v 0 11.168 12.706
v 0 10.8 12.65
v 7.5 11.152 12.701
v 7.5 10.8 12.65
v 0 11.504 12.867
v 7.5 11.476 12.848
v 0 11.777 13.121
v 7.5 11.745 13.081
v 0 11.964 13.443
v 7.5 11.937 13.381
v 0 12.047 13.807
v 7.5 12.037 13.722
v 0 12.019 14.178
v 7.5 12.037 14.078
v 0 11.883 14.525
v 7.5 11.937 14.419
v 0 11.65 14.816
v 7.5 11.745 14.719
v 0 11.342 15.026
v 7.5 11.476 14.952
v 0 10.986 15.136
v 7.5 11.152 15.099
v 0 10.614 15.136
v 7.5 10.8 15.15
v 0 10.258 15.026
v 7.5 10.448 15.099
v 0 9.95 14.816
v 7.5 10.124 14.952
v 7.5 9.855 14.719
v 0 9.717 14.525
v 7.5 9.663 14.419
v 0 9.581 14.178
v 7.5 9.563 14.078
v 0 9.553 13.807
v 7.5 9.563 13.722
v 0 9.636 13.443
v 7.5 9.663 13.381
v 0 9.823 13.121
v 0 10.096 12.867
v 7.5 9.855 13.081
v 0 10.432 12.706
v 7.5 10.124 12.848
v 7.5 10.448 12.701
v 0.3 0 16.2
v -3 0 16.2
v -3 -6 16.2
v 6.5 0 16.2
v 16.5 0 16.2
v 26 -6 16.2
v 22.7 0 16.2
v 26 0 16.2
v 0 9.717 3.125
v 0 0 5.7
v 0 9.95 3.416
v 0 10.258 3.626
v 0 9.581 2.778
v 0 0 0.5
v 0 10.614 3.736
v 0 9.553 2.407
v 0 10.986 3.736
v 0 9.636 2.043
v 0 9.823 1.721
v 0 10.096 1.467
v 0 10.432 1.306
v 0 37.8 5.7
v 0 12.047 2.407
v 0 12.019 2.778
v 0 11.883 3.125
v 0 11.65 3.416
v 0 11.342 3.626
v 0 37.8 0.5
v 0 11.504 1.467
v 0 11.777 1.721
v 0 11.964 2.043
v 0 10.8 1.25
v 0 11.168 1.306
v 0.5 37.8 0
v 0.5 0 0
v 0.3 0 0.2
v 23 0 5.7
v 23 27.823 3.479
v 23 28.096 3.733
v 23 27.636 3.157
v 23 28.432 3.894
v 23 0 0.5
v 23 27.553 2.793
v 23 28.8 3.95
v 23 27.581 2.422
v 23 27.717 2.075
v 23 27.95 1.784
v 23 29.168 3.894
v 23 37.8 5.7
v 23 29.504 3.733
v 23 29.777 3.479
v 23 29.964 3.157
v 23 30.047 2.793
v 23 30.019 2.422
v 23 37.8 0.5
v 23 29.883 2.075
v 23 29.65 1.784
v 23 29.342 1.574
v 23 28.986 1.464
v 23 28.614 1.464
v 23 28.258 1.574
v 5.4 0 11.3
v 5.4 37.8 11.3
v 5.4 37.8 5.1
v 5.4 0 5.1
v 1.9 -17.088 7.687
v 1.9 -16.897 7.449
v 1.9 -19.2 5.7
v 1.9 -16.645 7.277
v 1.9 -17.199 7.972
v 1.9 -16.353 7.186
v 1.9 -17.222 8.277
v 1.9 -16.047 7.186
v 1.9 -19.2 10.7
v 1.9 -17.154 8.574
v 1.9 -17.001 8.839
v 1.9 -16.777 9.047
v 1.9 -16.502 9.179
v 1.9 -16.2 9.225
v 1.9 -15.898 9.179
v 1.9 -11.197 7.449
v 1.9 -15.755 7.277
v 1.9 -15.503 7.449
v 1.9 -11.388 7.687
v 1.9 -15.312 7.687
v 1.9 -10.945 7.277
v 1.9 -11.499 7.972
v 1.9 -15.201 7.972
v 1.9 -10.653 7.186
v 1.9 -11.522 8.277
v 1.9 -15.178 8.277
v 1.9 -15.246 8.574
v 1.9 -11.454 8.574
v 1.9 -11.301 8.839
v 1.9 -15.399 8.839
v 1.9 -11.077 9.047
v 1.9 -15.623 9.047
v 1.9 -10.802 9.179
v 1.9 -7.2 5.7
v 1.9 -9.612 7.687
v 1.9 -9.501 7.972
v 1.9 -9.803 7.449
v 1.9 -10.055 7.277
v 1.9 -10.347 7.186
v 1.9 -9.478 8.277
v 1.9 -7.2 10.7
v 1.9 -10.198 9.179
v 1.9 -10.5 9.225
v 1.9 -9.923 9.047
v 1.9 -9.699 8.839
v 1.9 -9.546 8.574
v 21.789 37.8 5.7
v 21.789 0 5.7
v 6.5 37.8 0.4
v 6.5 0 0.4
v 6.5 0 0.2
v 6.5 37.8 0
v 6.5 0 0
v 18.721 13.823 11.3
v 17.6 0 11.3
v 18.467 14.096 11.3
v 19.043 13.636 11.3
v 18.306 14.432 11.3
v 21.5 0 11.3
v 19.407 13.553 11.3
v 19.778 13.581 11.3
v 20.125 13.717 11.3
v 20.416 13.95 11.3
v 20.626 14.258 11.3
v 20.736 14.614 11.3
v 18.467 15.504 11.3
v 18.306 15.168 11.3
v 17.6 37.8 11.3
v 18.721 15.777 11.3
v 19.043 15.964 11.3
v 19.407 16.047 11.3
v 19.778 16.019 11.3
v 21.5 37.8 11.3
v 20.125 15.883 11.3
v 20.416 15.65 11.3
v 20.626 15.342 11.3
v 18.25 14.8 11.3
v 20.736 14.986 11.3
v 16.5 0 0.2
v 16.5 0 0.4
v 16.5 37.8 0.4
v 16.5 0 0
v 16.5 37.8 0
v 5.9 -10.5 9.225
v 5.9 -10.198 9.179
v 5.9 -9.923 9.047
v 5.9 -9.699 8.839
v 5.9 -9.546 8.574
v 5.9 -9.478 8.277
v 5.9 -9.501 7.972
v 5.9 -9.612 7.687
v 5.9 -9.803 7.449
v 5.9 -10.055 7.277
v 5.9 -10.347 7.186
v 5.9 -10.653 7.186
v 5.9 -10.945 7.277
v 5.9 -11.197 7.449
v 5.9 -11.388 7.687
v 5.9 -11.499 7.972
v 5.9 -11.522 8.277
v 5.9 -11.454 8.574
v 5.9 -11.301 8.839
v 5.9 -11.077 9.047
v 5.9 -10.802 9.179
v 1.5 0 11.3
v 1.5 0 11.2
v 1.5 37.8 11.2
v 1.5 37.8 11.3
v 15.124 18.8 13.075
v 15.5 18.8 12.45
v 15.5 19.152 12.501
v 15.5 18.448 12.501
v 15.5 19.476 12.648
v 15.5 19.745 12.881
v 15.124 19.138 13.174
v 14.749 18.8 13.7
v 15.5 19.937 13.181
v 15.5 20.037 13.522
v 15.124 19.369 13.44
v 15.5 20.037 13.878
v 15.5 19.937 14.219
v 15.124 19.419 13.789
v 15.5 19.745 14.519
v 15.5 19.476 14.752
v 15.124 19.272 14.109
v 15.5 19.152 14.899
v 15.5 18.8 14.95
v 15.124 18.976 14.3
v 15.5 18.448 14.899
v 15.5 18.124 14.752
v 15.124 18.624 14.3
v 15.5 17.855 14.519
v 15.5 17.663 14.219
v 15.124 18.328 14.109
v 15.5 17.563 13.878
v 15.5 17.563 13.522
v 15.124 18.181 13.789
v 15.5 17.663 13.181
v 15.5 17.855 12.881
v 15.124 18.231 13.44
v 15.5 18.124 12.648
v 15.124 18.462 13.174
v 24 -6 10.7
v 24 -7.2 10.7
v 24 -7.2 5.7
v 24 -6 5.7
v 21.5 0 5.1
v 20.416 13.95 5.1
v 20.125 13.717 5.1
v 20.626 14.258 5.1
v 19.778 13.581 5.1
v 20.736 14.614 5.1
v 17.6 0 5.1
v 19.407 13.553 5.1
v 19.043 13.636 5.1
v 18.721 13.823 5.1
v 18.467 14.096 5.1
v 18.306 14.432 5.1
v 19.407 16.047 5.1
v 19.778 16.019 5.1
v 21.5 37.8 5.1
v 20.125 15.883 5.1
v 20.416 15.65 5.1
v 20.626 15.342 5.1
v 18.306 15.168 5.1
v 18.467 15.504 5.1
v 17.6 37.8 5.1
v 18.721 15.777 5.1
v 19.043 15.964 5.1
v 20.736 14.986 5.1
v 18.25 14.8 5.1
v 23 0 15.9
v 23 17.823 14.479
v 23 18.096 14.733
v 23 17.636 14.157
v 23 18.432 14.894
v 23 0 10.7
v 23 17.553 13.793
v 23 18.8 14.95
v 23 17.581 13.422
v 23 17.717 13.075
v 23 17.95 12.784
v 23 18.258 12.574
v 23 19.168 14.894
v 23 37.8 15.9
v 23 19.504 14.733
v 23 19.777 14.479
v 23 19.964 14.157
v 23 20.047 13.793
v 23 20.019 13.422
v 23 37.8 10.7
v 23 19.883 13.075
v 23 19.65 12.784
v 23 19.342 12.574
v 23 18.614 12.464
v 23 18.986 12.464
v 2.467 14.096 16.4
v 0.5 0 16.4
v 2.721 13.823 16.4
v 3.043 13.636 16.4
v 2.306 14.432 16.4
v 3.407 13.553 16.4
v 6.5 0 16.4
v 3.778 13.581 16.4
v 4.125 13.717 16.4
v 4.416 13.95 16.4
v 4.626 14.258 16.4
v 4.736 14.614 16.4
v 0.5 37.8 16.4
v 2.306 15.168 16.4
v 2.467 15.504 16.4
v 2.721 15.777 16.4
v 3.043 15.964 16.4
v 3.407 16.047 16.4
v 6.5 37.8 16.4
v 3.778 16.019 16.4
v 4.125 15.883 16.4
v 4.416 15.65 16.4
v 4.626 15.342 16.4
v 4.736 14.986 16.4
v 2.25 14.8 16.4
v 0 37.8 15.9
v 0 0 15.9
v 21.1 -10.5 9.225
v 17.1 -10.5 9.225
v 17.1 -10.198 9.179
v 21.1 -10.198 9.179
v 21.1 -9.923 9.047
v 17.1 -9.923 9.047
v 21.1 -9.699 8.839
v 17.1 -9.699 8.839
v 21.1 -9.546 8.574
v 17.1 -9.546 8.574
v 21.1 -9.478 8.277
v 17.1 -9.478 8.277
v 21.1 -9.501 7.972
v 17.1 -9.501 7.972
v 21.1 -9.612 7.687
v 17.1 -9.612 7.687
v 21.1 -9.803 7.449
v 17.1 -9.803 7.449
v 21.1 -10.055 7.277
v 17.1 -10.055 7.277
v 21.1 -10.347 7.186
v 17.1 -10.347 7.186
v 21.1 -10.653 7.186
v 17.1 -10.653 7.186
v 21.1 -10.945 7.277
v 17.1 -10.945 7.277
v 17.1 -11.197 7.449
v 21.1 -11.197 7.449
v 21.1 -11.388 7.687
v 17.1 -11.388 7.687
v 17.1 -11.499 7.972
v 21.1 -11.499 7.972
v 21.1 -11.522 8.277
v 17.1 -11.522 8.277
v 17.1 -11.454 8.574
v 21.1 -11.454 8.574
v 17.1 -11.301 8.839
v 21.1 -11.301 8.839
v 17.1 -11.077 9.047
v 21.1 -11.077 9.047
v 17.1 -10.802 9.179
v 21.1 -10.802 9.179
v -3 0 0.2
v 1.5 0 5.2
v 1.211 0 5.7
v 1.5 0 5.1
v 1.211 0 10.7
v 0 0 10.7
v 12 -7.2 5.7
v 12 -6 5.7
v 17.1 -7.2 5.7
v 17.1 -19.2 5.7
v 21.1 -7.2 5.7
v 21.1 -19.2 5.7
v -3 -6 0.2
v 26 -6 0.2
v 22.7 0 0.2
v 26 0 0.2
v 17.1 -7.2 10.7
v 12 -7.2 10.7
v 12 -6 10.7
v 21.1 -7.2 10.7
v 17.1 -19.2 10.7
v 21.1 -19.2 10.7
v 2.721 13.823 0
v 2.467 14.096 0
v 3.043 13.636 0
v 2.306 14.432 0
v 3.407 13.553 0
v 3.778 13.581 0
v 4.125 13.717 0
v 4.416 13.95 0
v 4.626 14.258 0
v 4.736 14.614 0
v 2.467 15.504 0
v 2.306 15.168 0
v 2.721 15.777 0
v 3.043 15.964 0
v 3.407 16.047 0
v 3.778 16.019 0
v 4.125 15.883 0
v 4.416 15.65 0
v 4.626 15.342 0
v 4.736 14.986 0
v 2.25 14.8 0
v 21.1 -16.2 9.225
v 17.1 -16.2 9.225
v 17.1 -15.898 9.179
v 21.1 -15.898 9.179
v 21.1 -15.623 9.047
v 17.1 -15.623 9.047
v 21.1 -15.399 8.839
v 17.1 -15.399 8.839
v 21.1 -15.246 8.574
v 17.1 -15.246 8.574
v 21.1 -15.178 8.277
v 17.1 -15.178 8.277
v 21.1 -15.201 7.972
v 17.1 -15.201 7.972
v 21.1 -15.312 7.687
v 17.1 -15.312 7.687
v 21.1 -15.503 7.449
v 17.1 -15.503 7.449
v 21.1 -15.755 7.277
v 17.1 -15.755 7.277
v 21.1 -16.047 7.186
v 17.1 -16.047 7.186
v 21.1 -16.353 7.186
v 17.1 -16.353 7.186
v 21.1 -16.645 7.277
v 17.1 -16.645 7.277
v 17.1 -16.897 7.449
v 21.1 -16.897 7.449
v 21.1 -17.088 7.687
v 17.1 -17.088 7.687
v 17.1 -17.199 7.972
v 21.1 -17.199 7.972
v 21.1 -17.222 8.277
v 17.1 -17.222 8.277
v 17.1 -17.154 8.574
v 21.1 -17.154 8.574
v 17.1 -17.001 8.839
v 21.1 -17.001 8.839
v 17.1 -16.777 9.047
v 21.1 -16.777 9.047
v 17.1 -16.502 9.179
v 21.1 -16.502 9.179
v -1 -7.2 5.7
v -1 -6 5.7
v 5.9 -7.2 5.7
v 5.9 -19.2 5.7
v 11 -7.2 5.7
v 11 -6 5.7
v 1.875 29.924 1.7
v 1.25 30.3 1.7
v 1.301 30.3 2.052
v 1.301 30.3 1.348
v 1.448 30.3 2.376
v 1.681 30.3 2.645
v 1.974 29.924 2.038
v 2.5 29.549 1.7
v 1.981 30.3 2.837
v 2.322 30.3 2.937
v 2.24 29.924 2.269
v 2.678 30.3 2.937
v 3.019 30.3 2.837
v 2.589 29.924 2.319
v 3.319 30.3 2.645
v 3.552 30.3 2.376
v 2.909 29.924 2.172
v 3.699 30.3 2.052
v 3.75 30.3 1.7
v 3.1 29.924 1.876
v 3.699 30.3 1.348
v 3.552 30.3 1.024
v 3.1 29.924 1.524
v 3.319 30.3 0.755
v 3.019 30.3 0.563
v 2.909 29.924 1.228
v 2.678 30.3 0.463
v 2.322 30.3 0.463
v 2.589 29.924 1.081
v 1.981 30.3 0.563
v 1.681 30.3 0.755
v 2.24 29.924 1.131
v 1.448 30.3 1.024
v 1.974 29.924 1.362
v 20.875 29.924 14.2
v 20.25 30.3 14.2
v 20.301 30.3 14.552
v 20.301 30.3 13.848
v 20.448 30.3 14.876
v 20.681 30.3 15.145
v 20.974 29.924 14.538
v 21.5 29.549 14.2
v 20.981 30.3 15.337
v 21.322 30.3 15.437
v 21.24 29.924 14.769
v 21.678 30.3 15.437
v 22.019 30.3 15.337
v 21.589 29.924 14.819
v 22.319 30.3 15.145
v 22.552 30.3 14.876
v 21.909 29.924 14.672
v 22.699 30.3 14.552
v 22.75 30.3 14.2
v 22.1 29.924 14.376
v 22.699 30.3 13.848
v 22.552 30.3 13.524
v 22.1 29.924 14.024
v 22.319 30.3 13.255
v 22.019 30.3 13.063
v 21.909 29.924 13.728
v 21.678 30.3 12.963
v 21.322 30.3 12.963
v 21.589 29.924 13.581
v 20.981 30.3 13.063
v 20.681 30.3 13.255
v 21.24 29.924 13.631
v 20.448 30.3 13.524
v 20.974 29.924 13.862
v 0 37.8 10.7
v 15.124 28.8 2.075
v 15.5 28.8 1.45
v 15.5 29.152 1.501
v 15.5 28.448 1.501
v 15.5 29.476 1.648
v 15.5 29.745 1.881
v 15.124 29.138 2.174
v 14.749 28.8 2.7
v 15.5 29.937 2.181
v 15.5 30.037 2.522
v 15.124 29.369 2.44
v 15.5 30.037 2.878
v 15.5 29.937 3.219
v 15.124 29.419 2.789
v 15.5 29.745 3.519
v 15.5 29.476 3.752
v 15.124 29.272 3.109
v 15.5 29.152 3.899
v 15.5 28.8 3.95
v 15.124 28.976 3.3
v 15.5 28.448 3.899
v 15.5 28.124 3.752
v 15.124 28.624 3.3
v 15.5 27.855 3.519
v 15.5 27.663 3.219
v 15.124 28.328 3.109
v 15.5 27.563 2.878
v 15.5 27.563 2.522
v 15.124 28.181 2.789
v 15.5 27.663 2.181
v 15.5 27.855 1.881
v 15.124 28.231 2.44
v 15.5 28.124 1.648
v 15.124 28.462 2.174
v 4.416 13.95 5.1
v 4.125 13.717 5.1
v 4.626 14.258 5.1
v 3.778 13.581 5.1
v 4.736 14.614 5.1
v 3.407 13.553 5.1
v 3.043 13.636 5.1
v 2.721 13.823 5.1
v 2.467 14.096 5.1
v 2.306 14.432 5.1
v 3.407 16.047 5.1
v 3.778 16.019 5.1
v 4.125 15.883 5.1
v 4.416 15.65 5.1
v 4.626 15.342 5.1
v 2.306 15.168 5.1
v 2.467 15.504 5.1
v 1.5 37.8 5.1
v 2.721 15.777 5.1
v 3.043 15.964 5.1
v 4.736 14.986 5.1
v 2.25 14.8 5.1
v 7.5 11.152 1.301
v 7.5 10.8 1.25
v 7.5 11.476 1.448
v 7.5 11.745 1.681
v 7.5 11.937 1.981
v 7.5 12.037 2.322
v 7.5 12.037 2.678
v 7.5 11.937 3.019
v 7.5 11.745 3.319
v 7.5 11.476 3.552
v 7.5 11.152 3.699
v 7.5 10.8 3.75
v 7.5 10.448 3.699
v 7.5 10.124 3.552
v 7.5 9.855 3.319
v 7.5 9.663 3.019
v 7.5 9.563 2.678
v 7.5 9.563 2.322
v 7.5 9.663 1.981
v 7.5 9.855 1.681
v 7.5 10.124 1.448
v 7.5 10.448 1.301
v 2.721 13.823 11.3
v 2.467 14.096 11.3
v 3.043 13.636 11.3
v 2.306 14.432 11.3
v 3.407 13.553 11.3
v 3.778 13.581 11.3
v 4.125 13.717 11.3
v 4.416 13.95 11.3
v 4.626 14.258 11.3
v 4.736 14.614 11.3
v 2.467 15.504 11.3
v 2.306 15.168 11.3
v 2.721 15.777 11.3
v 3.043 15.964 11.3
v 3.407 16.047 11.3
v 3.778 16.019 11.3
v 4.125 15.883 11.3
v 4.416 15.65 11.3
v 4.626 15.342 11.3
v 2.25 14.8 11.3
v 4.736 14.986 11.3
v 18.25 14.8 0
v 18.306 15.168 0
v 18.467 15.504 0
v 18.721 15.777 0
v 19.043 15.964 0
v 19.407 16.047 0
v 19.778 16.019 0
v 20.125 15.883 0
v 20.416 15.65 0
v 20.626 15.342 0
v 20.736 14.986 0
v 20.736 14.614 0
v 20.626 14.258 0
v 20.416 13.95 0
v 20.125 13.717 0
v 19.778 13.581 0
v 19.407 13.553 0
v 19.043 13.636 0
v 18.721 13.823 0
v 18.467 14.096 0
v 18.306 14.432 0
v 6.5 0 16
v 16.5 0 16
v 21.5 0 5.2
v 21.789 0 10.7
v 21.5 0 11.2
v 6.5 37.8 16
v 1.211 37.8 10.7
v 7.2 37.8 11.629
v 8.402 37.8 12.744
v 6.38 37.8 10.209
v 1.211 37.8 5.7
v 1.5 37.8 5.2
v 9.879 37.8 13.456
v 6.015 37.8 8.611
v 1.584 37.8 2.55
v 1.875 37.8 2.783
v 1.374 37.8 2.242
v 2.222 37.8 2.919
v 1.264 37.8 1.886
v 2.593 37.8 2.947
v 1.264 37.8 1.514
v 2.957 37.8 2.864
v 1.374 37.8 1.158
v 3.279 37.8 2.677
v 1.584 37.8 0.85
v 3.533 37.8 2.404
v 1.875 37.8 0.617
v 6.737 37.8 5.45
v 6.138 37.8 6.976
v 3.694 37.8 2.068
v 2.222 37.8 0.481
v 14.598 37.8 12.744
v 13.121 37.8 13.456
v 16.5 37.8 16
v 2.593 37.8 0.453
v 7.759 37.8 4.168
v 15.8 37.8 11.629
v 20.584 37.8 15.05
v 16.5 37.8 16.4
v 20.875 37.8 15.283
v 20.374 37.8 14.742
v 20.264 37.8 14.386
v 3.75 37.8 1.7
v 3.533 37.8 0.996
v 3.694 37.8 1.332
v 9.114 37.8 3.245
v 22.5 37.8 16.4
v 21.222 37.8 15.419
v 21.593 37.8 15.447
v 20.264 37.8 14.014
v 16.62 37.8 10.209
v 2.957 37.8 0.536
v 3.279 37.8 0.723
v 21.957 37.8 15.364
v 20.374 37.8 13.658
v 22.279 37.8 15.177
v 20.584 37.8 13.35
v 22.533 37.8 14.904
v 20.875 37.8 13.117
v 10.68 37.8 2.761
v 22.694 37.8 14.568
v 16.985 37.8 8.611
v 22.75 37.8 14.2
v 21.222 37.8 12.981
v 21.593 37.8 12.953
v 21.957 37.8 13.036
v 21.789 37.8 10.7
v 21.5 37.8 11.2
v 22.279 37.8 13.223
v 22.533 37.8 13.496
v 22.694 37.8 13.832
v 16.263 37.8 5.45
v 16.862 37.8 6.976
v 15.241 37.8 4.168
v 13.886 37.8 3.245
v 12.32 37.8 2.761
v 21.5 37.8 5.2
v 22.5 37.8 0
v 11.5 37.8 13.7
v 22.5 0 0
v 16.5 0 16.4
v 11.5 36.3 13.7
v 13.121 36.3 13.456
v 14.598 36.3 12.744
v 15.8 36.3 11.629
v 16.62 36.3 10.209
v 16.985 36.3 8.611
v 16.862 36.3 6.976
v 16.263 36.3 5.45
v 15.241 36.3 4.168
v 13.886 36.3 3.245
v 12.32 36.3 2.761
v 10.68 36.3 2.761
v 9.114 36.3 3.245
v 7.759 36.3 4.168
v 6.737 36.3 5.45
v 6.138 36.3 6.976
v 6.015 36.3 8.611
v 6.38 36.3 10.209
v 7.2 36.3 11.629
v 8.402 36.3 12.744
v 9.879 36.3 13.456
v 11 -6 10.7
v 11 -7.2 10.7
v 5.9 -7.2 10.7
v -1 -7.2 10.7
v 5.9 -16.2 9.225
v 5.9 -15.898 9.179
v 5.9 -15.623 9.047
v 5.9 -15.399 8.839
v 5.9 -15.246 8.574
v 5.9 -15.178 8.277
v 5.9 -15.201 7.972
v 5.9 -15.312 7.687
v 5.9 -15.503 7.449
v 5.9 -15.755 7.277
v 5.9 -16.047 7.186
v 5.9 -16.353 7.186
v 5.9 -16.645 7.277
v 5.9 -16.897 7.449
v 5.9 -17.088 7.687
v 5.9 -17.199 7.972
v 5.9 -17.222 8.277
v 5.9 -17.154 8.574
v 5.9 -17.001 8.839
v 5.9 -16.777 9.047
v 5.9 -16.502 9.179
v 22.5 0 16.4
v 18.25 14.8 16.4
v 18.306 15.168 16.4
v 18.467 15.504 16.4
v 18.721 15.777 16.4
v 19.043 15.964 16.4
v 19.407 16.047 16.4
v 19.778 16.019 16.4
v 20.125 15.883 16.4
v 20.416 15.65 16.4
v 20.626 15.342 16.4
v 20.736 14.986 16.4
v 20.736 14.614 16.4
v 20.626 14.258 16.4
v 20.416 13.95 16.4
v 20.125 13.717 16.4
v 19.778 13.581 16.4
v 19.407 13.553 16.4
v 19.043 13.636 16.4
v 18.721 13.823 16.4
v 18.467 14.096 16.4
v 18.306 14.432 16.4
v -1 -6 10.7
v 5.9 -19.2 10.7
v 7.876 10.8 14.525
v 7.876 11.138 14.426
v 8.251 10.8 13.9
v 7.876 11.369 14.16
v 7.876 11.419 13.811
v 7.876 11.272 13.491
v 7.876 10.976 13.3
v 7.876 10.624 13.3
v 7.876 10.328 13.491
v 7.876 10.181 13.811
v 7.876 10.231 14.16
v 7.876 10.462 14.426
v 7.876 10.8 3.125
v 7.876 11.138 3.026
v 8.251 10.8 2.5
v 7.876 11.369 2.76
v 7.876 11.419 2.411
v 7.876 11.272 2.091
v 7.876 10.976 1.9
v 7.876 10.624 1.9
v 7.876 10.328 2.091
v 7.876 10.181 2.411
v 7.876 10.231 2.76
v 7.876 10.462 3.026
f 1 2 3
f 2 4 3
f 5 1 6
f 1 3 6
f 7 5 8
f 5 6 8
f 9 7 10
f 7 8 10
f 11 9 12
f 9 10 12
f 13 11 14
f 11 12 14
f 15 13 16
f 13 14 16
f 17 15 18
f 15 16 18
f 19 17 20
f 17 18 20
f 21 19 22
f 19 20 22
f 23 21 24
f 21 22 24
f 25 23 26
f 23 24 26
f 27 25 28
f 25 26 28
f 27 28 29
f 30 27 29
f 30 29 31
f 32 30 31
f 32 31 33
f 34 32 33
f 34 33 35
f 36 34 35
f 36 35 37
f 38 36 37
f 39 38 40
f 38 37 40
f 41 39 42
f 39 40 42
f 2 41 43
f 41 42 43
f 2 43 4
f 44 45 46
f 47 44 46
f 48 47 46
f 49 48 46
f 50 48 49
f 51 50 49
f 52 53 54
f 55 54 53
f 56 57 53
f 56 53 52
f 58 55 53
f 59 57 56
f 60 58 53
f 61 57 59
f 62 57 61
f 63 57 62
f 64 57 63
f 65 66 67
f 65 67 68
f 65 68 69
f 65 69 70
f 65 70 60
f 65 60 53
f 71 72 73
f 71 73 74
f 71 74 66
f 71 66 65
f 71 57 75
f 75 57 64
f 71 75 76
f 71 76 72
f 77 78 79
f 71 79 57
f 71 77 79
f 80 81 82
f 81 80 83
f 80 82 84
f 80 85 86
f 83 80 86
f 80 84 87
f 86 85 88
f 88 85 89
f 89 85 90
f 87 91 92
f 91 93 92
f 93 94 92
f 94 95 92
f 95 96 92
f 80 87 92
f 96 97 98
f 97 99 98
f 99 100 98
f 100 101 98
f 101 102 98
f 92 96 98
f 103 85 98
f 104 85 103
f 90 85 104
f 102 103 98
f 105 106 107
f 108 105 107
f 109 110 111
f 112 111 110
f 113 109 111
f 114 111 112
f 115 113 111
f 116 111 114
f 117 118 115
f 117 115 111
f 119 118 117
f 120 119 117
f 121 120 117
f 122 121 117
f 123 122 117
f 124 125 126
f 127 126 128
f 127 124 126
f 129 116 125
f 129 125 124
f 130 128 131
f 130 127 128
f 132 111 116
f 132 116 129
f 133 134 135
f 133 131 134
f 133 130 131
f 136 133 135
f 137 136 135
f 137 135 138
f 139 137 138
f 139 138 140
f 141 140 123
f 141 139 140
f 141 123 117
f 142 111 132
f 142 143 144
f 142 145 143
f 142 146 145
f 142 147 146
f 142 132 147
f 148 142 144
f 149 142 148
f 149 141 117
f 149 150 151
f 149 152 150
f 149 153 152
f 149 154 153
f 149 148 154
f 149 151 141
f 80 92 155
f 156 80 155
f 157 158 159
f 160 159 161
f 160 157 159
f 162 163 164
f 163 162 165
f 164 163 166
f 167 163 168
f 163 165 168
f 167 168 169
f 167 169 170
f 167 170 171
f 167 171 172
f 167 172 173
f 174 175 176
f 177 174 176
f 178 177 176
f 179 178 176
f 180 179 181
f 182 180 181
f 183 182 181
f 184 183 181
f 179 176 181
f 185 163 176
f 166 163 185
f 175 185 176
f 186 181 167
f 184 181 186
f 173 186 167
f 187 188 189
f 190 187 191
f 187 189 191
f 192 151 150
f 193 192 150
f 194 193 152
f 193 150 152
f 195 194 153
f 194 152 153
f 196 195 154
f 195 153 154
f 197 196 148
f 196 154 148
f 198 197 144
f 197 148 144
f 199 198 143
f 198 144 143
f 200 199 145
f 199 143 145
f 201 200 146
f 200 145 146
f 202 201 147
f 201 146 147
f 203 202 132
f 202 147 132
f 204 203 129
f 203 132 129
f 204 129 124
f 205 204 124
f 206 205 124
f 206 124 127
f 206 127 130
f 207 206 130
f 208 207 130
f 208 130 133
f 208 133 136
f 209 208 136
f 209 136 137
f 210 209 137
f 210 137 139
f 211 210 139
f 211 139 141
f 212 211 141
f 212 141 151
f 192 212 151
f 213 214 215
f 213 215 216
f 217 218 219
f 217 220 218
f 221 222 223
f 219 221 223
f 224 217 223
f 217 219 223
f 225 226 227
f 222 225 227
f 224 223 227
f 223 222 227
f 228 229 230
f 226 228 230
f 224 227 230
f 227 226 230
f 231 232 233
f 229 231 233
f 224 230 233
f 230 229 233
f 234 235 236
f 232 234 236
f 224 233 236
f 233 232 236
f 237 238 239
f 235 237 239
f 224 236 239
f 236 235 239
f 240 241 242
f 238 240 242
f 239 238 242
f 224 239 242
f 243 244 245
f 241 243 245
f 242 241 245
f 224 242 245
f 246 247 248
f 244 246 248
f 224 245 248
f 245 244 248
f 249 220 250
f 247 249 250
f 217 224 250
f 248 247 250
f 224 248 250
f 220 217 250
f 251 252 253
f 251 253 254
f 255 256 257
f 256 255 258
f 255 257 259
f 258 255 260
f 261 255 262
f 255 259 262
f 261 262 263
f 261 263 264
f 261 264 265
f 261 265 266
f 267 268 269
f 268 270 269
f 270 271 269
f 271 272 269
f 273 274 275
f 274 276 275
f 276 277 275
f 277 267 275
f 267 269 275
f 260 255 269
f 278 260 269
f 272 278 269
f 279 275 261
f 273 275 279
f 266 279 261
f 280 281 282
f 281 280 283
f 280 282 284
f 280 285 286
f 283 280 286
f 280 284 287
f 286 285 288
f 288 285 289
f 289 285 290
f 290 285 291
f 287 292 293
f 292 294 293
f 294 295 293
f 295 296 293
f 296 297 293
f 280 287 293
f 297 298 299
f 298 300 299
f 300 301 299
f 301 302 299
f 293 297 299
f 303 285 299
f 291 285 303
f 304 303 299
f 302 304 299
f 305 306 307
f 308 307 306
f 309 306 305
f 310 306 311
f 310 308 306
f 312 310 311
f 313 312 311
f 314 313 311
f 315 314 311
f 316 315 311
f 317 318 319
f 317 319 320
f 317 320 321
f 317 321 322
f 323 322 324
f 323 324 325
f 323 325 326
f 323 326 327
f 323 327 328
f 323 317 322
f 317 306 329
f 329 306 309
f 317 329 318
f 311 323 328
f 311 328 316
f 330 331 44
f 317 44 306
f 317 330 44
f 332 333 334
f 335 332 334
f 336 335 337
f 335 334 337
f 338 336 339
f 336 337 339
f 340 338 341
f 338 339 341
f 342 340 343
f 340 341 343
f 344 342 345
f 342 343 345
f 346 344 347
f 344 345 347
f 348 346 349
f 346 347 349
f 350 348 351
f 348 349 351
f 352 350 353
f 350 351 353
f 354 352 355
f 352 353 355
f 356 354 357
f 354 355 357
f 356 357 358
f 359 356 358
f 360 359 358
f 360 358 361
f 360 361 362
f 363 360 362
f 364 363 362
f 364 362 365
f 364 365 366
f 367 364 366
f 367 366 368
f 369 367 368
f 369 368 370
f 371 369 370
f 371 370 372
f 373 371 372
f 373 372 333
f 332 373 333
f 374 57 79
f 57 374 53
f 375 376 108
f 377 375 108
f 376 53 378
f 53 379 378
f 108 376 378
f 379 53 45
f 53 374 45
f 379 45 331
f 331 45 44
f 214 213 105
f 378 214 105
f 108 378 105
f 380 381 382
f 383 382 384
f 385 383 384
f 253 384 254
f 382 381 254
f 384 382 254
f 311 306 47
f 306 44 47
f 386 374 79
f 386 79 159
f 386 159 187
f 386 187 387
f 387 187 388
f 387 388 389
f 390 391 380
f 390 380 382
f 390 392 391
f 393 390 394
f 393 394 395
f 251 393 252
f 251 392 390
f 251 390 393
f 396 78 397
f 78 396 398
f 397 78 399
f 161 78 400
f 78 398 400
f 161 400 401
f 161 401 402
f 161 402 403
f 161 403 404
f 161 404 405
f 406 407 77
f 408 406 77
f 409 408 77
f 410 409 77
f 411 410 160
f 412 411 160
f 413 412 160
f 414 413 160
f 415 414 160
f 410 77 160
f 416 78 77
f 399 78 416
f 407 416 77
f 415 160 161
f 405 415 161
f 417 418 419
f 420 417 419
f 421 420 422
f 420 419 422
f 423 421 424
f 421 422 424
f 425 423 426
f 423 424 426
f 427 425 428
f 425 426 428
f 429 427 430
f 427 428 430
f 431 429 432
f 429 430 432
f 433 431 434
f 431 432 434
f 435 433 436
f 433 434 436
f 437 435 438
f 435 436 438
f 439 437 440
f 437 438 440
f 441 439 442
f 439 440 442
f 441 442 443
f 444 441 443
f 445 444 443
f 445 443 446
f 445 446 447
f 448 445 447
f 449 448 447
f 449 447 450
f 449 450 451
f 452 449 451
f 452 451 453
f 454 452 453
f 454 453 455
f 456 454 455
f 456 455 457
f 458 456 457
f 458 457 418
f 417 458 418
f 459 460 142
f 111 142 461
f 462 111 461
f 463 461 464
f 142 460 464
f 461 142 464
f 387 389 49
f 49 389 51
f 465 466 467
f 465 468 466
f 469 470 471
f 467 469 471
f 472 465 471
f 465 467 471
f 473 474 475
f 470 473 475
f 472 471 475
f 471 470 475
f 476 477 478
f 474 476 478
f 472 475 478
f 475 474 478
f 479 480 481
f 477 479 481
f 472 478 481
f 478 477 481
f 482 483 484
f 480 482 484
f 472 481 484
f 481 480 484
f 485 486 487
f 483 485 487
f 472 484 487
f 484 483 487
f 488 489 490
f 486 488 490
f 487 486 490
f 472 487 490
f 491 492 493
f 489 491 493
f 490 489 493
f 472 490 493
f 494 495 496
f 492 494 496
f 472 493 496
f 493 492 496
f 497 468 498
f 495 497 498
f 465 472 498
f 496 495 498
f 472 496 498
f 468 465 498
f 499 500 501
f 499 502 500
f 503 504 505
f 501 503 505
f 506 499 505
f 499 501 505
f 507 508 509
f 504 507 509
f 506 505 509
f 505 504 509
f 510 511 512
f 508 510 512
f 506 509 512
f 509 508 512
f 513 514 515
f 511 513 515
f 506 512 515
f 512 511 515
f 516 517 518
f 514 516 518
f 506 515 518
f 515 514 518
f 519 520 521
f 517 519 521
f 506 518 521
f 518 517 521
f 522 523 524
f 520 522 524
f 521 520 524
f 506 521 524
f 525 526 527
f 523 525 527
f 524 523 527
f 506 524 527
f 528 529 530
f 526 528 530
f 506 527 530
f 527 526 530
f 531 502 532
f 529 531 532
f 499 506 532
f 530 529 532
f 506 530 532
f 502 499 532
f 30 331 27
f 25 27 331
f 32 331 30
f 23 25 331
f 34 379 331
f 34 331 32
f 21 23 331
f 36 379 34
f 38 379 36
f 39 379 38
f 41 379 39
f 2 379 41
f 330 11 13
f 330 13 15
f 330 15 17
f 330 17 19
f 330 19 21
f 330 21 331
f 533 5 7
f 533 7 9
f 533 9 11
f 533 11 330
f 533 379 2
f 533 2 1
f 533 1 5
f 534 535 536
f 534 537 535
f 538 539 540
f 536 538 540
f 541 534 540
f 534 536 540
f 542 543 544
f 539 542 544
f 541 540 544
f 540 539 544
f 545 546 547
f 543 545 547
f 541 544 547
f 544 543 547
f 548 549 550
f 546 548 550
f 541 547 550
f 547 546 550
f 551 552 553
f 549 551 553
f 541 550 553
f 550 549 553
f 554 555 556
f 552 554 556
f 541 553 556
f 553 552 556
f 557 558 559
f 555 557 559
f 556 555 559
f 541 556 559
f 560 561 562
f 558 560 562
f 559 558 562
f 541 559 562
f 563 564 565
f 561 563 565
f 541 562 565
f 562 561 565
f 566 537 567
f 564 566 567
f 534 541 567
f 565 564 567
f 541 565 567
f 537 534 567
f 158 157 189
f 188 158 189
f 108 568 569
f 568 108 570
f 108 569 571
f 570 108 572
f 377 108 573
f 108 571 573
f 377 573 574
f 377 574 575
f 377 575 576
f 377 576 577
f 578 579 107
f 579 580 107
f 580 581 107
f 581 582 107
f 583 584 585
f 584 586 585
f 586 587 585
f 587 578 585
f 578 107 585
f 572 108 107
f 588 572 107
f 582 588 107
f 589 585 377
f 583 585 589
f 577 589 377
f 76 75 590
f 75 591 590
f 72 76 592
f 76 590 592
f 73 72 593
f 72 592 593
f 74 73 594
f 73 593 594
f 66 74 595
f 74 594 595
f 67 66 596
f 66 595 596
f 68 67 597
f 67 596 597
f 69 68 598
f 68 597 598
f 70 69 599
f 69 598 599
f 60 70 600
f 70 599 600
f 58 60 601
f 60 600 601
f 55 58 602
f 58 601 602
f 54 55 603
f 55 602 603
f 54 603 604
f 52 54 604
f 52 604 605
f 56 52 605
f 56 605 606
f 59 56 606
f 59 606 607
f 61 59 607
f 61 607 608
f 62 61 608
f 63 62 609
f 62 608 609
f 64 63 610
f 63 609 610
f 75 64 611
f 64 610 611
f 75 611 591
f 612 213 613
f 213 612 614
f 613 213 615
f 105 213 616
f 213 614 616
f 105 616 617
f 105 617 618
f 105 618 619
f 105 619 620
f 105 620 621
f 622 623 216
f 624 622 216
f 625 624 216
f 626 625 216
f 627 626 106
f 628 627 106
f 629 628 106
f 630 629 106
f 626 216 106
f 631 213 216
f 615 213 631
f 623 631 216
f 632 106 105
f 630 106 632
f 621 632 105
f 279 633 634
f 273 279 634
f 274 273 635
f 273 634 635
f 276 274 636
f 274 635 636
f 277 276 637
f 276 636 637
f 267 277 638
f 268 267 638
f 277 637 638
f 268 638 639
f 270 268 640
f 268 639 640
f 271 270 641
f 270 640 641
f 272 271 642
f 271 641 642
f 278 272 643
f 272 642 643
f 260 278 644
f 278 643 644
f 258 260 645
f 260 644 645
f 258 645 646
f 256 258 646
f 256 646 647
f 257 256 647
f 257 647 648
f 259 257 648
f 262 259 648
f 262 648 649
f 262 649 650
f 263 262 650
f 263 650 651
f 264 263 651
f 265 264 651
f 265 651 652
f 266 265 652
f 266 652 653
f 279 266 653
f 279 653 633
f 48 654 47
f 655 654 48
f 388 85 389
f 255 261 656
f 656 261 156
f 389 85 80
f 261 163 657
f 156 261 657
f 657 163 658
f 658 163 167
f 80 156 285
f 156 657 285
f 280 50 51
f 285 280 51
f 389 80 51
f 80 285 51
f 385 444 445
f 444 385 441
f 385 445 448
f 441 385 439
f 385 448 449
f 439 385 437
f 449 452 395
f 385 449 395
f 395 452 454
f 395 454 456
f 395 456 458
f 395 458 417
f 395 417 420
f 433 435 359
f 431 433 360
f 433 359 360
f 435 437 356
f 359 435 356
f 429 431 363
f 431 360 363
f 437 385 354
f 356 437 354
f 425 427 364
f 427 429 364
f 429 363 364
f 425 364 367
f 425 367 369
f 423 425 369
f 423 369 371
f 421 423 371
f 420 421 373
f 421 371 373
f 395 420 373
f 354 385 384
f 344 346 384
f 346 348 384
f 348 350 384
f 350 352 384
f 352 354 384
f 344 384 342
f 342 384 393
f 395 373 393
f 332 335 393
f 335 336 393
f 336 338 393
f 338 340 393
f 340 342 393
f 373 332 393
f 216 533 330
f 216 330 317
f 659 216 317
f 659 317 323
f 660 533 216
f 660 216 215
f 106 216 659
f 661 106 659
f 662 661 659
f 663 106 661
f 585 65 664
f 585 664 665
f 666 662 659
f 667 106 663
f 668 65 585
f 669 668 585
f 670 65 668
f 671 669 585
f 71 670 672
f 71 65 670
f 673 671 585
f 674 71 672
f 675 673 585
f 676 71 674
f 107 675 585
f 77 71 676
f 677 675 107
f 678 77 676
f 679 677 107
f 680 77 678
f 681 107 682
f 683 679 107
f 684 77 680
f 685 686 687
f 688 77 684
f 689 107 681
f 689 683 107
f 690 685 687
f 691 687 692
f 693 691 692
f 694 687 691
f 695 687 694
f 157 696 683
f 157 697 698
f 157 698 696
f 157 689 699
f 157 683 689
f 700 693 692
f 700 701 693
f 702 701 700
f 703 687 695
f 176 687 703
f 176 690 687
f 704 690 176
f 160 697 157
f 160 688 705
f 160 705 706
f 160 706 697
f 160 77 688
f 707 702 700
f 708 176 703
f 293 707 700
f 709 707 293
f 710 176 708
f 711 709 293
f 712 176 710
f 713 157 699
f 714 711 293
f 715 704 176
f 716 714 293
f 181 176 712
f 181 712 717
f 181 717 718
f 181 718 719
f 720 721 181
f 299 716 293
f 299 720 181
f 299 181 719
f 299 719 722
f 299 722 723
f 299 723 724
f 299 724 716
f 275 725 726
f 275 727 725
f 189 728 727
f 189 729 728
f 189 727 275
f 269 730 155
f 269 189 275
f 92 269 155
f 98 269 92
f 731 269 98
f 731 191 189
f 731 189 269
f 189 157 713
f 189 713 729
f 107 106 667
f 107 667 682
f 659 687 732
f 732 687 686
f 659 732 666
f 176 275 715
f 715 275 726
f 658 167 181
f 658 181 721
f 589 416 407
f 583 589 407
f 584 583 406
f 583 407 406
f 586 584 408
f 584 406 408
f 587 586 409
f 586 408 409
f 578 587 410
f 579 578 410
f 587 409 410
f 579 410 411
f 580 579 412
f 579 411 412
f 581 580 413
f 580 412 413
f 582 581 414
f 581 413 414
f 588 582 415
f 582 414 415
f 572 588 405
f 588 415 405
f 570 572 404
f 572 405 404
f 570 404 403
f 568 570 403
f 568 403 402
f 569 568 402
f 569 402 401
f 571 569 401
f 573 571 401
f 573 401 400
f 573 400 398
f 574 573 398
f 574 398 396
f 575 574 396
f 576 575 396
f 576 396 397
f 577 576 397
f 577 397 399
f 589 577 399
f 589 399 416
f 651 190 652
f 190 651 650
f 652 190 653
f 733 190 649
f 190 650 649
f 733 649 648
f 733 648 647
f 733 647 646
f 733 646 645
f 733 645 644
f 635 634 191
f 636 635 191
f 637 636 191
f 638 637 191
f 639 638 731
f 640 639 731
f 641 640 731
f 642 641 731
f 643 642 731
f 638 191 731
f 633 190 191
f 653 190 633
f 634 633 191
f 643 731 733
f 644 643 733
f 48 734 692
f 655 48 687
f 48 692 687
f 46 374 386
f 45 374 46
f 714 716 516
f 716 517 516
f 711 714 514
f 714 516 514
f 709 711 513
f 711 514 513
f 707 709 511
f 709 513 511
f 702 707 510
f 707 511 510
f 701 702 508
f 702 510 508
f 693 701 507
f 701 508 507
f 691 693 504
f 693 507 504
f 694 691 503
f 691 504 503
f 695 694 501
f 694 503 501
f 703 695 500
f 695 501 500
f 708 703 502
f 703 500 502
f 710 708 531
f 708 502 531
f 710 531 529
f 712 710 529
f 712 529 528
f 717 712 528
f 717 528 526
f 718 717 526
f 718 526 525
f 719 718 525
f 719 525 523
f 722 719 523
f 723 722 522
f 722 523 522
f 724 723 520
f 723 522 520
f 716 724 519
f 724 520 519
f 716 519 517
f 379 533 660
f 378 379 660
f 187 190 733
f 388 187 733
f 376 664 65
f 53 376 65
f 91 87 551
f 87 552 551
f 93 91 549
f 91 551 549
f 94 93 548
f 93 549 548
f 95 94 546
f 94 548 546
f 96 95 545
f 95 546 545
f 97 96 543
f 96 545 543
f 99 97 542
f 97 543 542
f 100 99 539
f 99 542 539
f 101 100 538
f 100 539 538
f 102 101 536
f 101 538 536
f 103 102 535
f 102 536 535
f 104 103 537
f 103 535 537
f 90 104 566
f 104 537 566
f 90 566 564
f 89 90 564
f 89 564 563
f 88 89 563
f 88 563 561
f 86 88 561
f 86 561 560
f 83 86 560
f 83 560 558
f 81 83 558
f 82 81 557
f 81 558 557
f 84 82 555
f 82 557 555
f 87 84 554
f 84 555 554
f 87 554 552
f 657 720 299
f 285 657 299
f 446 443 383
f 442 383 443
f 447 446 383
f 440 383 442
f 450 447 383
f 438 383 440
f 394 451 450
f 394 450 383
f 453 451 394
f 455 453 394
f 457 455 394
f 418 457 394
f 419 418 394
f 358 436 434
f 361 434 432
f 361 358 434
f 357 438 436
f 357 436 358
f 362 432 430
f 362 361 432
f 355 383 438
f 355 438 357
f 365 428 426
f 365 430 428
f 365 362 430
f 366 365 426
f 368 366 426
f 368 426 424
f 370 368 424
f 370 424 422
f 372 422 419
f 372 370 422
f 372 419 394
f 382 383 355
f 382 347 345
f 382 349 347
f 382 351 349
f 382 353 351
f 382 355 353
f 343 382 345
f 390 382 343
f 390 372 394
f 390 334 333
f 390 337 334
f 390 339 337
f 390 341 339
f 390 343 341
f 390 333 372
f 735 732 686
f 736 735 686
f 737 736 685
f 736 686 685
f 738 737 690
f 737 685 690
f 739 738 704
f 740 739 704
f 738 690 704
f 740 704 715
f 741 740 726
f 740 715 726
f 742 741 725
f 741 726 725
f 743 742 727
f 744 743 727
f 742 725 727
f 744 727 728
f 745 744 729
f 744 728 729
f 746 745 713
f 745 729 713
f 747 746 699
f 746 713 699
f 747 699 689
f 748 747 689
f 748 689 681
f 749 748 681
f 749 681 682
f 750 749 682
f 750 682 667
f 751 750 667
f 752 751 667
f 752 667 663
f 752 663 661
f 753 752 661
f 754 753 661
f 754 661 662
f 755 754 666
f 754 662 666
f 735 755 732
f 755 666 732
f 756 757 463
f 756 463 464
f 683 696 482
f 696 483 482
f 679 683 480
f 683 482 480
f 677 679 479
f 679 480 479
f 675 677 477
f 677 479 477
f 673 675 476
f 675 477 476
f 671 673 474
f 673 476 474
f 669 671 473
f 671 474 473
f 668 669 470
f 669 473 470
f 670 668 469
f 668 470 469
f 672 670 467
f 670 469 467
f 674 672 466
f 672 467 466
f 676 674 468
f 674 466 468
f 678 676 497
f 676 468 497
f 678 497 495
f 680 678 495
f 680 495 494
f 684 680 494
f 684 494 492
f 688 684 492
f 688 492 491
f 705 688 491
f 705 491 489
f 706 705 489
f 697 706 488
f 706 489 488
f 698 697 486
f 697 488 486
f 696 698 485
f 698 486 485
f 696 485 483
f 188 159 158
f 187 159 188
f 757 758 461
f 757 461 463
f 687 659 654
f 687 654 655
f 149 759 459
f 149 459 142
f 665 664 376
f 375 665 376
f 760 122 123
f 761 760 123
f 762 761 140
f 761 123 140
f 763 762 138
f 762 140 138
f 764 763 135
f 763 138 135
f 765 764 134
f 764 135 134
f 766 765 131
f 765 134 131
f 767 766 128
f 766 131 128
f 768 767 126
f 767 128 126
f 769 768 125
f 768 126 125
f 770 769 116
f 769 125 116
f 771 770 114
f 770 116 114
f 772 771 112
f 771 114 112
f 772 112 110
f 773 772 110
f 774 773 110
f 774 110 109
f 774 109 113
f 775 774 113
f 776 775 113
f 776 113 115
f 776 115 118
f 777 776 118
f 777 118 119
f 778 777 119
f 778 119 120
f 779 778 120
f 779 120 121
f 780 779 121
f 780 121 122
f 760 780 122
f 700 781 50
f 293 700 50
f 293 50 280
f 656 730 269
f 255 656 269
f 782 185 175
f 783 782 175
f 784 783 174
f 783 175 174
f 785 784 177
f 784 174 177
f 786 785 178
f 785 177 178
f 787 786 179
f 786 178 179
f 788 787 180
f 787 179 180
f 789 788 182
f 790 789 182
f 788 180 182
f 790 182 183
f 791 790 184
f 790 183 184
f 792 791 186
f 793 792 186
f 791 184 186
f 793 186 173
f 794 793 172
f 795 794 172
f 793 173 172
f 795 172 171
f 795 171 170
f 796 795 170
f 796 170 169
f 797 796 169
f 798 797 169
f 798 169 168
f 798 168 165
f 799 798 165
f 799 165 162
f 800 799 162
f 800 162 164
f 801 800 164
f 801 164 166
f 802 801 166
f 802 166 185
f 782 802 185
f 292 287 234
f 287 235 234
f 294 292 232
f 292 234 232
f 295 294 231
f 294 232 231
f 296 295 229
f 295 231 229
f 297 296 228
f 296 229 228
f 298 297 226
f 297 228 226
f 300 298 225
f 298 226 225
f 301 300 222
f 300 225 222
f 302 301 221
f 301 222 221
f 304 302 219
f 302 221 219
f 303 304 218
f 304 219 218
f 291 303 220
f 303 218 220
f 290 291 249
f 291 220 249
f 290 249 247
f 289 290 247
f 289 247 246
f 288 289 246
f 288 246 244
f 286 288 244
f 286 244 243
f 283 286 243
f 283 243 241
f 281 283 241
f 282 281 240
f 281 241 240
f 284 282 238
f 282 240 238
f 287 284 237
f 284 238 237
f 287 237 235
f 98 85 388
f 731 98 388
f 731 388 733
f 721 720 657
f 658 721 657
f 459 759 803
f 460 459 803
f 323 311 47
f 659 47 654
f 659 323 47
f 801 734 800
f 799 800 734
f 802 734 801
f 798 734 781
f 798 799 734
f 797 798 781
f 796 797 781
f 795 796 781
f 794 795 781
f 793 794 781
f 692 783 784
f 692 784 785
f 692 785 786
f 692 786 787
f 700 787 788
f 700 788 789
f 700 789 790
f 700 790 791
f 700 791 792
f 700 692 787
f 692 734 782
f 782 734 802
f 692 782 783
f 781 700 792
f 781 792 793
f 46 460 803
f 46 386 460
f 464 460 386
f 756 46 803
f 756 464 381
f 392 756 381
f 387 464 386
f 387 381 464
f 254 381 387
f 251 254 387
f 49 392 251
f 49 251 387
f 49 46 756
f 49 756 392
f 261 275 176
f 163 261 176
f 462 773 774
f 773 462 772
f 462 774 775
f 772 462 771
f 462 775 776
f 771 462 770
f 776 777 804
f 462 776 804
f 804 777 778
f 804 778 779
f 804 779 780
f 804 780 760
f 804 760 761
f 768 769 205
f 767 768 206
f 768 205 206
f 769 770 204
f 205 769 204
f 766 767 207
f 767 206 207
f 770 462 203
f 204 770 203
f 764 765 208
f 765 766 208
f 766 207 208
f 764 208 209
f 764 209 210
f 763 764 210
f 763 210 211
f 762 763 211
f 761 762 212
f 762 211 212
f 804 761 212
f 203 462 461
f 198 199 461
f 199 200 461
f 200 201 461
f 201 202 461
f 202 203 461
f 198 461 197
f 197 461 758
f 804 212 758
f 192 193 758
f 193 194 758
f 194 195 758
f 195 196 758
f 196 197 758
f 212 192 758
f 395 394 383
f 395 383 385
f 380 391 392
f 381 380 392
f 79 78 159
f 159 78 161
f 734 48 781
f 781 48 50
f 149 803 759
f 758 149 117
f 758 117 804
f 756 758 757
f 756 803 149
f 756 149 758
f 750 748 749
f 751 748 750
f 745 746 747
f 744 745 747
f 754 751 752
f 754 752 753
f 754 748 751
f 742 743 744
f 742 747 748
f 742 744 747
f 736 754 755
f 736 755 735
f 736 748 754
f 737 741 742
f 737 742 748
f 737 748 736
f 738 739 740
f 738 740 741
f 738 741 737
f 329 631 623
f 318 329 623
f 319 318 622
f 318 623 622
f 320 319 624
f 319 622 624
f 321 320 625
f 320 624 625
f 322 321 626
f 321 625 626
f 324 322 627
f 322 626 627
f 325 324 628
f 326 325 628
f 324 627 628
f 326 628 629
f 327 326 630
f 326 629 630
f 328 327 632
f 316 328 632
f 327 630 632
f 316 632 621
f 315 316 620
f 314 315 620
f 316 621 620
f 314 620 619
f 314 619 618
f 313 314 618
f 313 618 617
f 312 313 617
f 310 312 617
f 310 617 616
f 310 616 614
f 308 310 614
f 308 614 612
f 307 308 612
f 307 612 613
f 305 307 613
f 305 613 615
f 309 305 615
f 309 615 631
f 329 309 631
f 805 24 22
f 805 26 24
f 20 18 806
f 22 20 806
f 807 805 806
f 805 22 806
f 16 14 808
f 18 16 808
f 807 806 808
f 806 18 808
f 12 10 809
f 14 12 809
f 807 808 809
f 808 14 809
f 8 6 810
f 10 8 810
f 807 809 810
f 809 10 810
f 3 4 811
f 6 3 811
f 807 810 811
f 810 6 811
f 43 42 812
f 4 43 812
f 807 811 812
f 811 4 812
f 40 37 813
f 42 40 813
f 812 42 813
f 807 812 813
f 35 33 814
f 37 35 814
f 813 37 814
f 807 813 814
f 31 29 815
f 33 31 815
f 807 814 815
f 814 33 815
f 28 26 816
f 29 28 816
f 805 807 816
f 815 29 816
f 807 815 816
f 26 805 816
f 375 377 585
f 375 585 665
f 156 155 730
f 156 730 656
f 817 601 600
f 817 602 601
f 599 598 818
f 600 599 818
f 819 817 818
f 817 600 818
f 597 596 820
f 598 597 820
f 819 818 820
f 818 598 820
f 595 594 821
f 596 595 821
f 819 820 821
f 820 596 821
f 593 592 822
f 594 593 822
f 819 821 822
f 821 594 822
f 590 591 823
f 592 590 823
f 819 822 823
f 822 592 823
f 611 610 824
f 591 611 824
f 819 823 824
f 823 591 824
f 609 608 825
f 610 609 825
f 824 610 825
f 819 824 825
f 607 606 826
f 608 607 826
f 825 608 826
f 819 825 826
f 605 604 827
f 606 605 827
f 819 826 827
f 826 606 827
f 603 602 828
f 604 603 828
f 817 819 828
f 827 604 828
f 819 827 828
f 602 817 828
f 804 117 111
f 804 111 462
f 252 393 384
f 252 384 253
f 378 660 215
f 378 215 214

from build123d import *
from OCP.BRepFilletAPI import BRepFilletAPI_MakeChamfer

# Parameters (mm, degrees)
SKETCH_1_W             = 23
SKETCH_1_H             = 37.8
EXTRUDE_1_DEPTH        = 16.4
SKETCH_19_W            = 29
SKETCH_19_H            = 16
EXTRUDE_3_DEPTH        = 6
SKETCH_5_W             = 4
SKETCH_5_H             = 5
EXTRUDE_2_DEPTH        = 13.2
SKETCH_20_W            = 2.9
SKETCH_20_H            = 1.2
SKETCH_20_W_2          = 5.1
EXTRUDE_4_DEPTH        = 5
HOLE_WIZARD_M2_5_1_D   = 2.05
HOLE_WIZARD_M3_6_D     = 2.5
HOLE_WIZARD_M3_6_DEPTH = 7.5
HOLE_WIZARD_M3_6_TIP   = 0.751075774
HOLE_WIZARD_M3_7_D     = 2.5
HOLE_WIZARD_M3_7_DEPTH = 7.5
HOLE_WIZARD_M3_7_TIP   = 0.751075774
HOLE_WIZARD_M3_5_D     = 2.5
SKETCH_15_R            = 5.5
CUT_EXTRUDE_4_DEPTH    = 1.5
HOLE_WIZARD_M3_4_D     = 2.5
HOLE_WIZARD_M3_4_DEPTH = 7.5
HOLE_WIZARD_M3_4_TIP   = 0.751075774
CUT_EXTRUDE_5_REACH    = 66.761
CHAMFER_1_SIZE         = 0.5
CHAMFER_1_SIZE2        = 0.288675135
CHAMFER_2_SIZE         = 0.5
CHAMFER_2_SIZE2        = 0.288675135
SKETCH_25_W            = 10
SKETCH_25_H            = 0.4
CUT_EXTRUDE_6_DEPTH    = 37.8
CHAMFER_3_SIZE         = 0.5


with BuildPart() as part:
    # 草图1 → 拉伸1 (new body)
    with BuildSketch(Plane.XY):
        with Locations((11.5, 18.9)):
            Rectangle(SKETCH_1_W, SKETCH_1_H)
    extrude(amount=EXTRUDE_1_DEPTH)

    # 草图19 → 拉伸3 (add)
    with BuildSketch(Plane.XZ):
        with Locations((11.5, 8.2)):
            Rectangle(SKETCH_19_W, SKETCH_19_H)
    extrude(amount=EXTRUDE_3_DEPTH)

    # 草图5 → 拉伸2 (add)
    with BuildSketch(Plane.XZ.offset(6)):
        with Locations((3.9, 8.2)):
            Rectangle(SKETCH_5_W, SKETCH_5_H)
        with Locations((19.1, 8.2)):
            Rectangle(SKETCH_5_W, SKETCH_5_H)
    extrude(amount=EXTRUDE_2_DEPTH)

    # 草图20 → 拉伸4 (add)
    with BuildSketch(Plane.XY.offset(10.7)):
        with Locations((0.45, -6.6)):
            Rectangle(SKETCH_20_W, SKETCH_20_H)
        with Locations((8.45, -6.6)):
            Rectangle(SKETCH_20_W_2, SKETCH_20_H)
        with Locations((14.55, -6.6)):
            Rectangle(SKETCH_20_W_2, SKETCH_20_H)
        with Locations((22.55, -6.6)):
            Rectangle(SKETCH_20_W, SKETCH_20_H)
    extrude(amount=-EXTRUDE_4_DEPTH)

    # M2.5 螺纹孔1 (through all)
    with Locations(Plane(origin=(21.1, 0, 0), x_dir=(0, 0, -1), z_dir=(1, 0, 0))):
        with Locations((-8.2, -16.2), (-8.2, -10.5)):
            Hole(HOLE_WIZARD_M2_5_1_D / 2)

    # M3 螺纹孔6
    with Locations(Plane(origin=(23, 0, 0), x_dir=(0, 0, -1), z_dir=(1, 0, 0))):
        with Locations((-2.7, 28.8), (-13.7, 18.8)):
            Hole(HOLE_WIZARD_M3_6_D / 2, depth=HOLE_WIZARD_M3_6_DEPTH)
            with Locations((0, 0, -(HOLE_WIZARD_M3_6_DEPTH + HOLE_WIZARD_M3_6_TIP / 2))):  # 118° drill point
                Cone(0, HOLE_WIZARD_M3_6_D / 2, HOLE_WIZARD_M3_6_TIP, mode=Mode.SUBTRACT)

    # M3 螺纹孔7
    with Locations(Plane.ZY):
        with Locations((2.5, 10.8), (13.9, 10.8)):
            Hole(HOLE_WIZARD_M3_7_D / 2, depth=HOLE_WIZARD_M3_7_DEPTH)
            with Locations((0, 0, -(HOLE_WIZARD_M3_7_DEPTH + HOLE_WIZARD_M3_7_TIP / 2))):  # 118° drill point
                Cone(0, HOLE_WIZARD_M3_7_D / 2, HOLE_WIZARD_M3_7_TIP, mode=Mode.SUBTRACT)

    # M3 螺纹孔5 (through all)
    with Locations(Plane.XY.offset(16.4)):
        with Locations((3.5, 14.8), (19.5, 14.8)):
            Hole(HOLE_WIZARD_M3_5_D / 2)

    # 草图15 → 切除-拉伸4 (cut)
    with BuildSketch(Plane(origin=(0, 37.8, 0), x_dir=(1, 0, 0), z_dir=(0, 1, 0))):
        with Locations(Location((11.5, -8.2, 0), (0, 0, 270))):
            Circle(SKETCH_15_R)
    extrude(amount=-CUT_EXTRUDE_4_DEPTH, mode=Mode.SUBTRACT)

    # M3 螺纹孔4
    with Locations(Plane(origin=(0, 37.8, 0), x_dir=(-1, 0, 0), z_dir=(0, 1, 0))):
        with Locations((-2.5, 1.7), (-21.5, 14.2)):
            Hole(HOLE_WIZARD_M3_4_D / 2, depth=HOLE_WIZARD_M3_4_DEPTH)
            with Locations((0, 0, -(HOLE_WIZARD_M3_4_DEPTH + HOLE_WIZARD_M3_4_TIP / 2))):  # 118° drill point
                Cone(0, HOLE_WIZARD_M3_4_D / 2, HOLE_WIZARD_M3_4_TIP, mode=Mode.SUBTRACT)

    # 切除-拉伸5: up to this face of the body (flat: up to its plane)
    cut_extrude_5_end = Plane(part.part.faces().sort_by_distance((-1.5, 0, 8.2))[0])
    # 草图18 → 切除-拉伸5 (cut, up to the picked face)
    with BuildSketch(Plane(origin=(0, 37.8, 0), x_dir=(1, 0, 0), z_dir=(0, 1, 0)), mode=Mode.PRIVATE) as cut_extrude_5_sk1:
        Polygon((23, -10.7), (23, -5.7), (21.5, -5.7), (21.5, -5.1), (17.6, -5.1), (17.6, -11.3), (21.5, -11.3), (21.5, -10.7), align=None)
    cut_extrude_5_tool1 = split(extrude(cut_extrude_5_sk1.sketch, amount=-CUT_EXTRUDE_5_REACH, mode=Mode.PRIVATE), bisect_by=cut_extrude_5_end, keep=Keep.BOTH, mode=Mode.PRIVATE)
    # 草图18 → 切除-拉伸5 (cut, up to the picked face)
    with BuildSketch(Plane(origin=(0, 37.8, 0), x_dir=(1, 0, 0), z_dir=(0, 1, 0)), mode=Mode.PRIVATE) as cut_extrude_5_sk2:
        Polygon((0, -10.7), (1.5, -10.7), (1.5, -11.3), (5.4, -11.3), (5.4, -5.1), (1.5, -5.1), (1.5, -5.7), (0, -5.7), align=None)
    cut_extrude_5_tool2 = split(extrude(cut_extrude_5_sk2.sketch, amount=-CUT_EXTRUDE_5_REACH, mode=Mode.PRIVATE), bisect_by=cut_extrude_5_end, keep=Keep.BOTH, mode=Mode.PRIVATE)
    add(cut_extrude_5_tool1.solids().sort_by(Axis((20.189205, 37.8, 8.2), (0, -1, 0)))[0], mode=Mode.SUBTRACT)
    add(cut_extrude_5_tool2.solids().sort_by(Axis((2.810795, 37.8, 8.2), (0, -1, 0)))[0], mode=Mode.SUBTRACT)

    # 倒角1: one chamfer whose edges measure the first distance from different faces: ONE call of the kernel's chamfer builder (chamfer() names one face for all edges)
    chamfer_1_edges_1 = [part.edges().sort_by_distance(p)[0] for p in [
        (21.5, 18.9, 10.7),
    ]]
    chamfer_1_side_1 = [part.faces().sort_by_distance(p)[0] for p in [
        (21.5, 18.9, 11),
    ]]
    chamfer_1_edges_2 = [part.edges().sort_by_distance(p)[0] for p in [
        (1.5, 18.9, 5.7),
    ]]
    chamfer_1_side_2 = [part.faces().sort_by_distance(p)[0] for p in [
        (1.5, 18.9, 5.4),
    ]]
    chamfer_1 = BRepFilletAPI_MakeChamfer(part.part.solid().wrapped)
    for e in chamfer_1_edges_1:
        chamfer_1.Add(CHAMFER_1_SIZE, CHAMFER_1_SIZE2, e.wrapped, chamfer_1_side_1[0].wrapped)  # the first distance lies on this face
    for e in chamfer_1_edges_2:
        chamfer_1.Add(CHAMFER_1_SIZE, CHAMFER_1_SIZE2, e.wrapped, chamfer_1_side_2[0].wrapped)  # the first distance lies on this face
    add(Compound.cast(chamfer_1.Shape()), mode=Mode.REPLACE)

    # 倒角2: one chamfer whose edges measure the first distance from different faces: ONE call of the kernel's chamfer builder (chamfer() names one face for all edges)
    chamfer_2_edges_1 = [part.edges().sort_by_distance(p)[0] for p in [
        (21.5, 18.9, 5.7),
    ]]
    chamfer_2_side_1 = [part.faces().sort_by_distance(p)[0] for p in [
        (21.5, 18.9, 5.4),
    ]]
    chamfer_2_edges_2 = [part.edges().sort_by_distance(p)[0] for p in [
        (1.5, 18.9, 10.7),
    ]]
    chamfer_2_side_2 = [part.faces().sort_by_distance(p)[0] for p in [
        (1.5, 18.9, 11),
    ]]
    chamfer_2 = BRepFilletAPI_MakeChamfer(part.part.solid().wrapped)
    for e in chamfer_2_edges_1:
        chamfer_2.Add(CHAMFER_2_SIZE, CHAMFER_2_SIZE2, e.wrapped, chamfer_2_side_1[0].wrapped)  # the first distance lies on this face
    for e in chamfer_2_edges_2:
        chamfer_2.Add(CHAMFER_2_SIZE, CHAMFER_2_SIZE2, e.wrapped, chamfer_2_side_2[0].wrapped)  # the first distance lies on this face
    add(Compound.cast(chamfer_2.Shape()), mode=Mode.REPLACE)

    # 草图25 → 切除-拉伸6 (cut)
    with BuildSketch(Plane(origin=(0, 37.8, 0), x_dir=(1, 0, 0), z_dir=(0, 1, 0))):
        with Locations((11.5, -0.2)):
            Rectangle(SKETCH_25_W, SKETCH_25_H)
        with Locations((11.5, -16.2)):
            Rectangle(SKETCH_25_W, SKETCH_25_H)
    extrude(amount=-CUT_EXTRUDE_6_DEPTH, mode=Mode.SUBTRACT)

    # 倒角3
    # the kernel refuses this chamfer: 0.5 mm, written as the material it takes off along each edge
    with BuildSketch(Plane(origin=(23, 0, 16.4), x_dir=(-0.9996219169112968, 0, 0.027495876610589005), z_dir=(0, 1, 0)), Plane(origin=(23, 0, 0), x_dir=(0.02749587661058908, 0, 0.9996219169112968), z_dir=(0, 1, 0))) as chamfer_3_piece_1:
        Polygon((CHAMFER_3_SIZE * 0.999621916911, -CHAMFER_3_SIZE * 0.0274958766106), (-CHAMFER_3_SIZE * 0.0274958766106, -CHAMFER_3_SIZE * 0.999621916911), (0, 0), align=None)
    extrude(amount=39.085841494, mode=Mode.SUBTRACT)
    with BuildSketch(Plane(origin=(0, 39.085841494, 16.4), x_dir=(-0.02749587661058639, 0, -0.9996219169112968), z_dir=(0, -1, 0)), Plane(origin=(0, 39.085841494, 0), x_dir=(0.9996219169112968, 0, -0.027495876610586372), z_dir=(0, -1, 0))) as chamfer_3_piece_2:
        Polygon((CHAMFER_3_SIZE * 0.999621916911, CHAMFER_3_SIZE * 0.0274958766106), (-CHAMFER_3_SIZE * 0.0274958766106, CHAMFER_3_SIZE * 0.999621916911), (0, 0), align=None)
    extrude(amount=39.085841494, mode=Mode.SUBTRACT)


solid = part.part
